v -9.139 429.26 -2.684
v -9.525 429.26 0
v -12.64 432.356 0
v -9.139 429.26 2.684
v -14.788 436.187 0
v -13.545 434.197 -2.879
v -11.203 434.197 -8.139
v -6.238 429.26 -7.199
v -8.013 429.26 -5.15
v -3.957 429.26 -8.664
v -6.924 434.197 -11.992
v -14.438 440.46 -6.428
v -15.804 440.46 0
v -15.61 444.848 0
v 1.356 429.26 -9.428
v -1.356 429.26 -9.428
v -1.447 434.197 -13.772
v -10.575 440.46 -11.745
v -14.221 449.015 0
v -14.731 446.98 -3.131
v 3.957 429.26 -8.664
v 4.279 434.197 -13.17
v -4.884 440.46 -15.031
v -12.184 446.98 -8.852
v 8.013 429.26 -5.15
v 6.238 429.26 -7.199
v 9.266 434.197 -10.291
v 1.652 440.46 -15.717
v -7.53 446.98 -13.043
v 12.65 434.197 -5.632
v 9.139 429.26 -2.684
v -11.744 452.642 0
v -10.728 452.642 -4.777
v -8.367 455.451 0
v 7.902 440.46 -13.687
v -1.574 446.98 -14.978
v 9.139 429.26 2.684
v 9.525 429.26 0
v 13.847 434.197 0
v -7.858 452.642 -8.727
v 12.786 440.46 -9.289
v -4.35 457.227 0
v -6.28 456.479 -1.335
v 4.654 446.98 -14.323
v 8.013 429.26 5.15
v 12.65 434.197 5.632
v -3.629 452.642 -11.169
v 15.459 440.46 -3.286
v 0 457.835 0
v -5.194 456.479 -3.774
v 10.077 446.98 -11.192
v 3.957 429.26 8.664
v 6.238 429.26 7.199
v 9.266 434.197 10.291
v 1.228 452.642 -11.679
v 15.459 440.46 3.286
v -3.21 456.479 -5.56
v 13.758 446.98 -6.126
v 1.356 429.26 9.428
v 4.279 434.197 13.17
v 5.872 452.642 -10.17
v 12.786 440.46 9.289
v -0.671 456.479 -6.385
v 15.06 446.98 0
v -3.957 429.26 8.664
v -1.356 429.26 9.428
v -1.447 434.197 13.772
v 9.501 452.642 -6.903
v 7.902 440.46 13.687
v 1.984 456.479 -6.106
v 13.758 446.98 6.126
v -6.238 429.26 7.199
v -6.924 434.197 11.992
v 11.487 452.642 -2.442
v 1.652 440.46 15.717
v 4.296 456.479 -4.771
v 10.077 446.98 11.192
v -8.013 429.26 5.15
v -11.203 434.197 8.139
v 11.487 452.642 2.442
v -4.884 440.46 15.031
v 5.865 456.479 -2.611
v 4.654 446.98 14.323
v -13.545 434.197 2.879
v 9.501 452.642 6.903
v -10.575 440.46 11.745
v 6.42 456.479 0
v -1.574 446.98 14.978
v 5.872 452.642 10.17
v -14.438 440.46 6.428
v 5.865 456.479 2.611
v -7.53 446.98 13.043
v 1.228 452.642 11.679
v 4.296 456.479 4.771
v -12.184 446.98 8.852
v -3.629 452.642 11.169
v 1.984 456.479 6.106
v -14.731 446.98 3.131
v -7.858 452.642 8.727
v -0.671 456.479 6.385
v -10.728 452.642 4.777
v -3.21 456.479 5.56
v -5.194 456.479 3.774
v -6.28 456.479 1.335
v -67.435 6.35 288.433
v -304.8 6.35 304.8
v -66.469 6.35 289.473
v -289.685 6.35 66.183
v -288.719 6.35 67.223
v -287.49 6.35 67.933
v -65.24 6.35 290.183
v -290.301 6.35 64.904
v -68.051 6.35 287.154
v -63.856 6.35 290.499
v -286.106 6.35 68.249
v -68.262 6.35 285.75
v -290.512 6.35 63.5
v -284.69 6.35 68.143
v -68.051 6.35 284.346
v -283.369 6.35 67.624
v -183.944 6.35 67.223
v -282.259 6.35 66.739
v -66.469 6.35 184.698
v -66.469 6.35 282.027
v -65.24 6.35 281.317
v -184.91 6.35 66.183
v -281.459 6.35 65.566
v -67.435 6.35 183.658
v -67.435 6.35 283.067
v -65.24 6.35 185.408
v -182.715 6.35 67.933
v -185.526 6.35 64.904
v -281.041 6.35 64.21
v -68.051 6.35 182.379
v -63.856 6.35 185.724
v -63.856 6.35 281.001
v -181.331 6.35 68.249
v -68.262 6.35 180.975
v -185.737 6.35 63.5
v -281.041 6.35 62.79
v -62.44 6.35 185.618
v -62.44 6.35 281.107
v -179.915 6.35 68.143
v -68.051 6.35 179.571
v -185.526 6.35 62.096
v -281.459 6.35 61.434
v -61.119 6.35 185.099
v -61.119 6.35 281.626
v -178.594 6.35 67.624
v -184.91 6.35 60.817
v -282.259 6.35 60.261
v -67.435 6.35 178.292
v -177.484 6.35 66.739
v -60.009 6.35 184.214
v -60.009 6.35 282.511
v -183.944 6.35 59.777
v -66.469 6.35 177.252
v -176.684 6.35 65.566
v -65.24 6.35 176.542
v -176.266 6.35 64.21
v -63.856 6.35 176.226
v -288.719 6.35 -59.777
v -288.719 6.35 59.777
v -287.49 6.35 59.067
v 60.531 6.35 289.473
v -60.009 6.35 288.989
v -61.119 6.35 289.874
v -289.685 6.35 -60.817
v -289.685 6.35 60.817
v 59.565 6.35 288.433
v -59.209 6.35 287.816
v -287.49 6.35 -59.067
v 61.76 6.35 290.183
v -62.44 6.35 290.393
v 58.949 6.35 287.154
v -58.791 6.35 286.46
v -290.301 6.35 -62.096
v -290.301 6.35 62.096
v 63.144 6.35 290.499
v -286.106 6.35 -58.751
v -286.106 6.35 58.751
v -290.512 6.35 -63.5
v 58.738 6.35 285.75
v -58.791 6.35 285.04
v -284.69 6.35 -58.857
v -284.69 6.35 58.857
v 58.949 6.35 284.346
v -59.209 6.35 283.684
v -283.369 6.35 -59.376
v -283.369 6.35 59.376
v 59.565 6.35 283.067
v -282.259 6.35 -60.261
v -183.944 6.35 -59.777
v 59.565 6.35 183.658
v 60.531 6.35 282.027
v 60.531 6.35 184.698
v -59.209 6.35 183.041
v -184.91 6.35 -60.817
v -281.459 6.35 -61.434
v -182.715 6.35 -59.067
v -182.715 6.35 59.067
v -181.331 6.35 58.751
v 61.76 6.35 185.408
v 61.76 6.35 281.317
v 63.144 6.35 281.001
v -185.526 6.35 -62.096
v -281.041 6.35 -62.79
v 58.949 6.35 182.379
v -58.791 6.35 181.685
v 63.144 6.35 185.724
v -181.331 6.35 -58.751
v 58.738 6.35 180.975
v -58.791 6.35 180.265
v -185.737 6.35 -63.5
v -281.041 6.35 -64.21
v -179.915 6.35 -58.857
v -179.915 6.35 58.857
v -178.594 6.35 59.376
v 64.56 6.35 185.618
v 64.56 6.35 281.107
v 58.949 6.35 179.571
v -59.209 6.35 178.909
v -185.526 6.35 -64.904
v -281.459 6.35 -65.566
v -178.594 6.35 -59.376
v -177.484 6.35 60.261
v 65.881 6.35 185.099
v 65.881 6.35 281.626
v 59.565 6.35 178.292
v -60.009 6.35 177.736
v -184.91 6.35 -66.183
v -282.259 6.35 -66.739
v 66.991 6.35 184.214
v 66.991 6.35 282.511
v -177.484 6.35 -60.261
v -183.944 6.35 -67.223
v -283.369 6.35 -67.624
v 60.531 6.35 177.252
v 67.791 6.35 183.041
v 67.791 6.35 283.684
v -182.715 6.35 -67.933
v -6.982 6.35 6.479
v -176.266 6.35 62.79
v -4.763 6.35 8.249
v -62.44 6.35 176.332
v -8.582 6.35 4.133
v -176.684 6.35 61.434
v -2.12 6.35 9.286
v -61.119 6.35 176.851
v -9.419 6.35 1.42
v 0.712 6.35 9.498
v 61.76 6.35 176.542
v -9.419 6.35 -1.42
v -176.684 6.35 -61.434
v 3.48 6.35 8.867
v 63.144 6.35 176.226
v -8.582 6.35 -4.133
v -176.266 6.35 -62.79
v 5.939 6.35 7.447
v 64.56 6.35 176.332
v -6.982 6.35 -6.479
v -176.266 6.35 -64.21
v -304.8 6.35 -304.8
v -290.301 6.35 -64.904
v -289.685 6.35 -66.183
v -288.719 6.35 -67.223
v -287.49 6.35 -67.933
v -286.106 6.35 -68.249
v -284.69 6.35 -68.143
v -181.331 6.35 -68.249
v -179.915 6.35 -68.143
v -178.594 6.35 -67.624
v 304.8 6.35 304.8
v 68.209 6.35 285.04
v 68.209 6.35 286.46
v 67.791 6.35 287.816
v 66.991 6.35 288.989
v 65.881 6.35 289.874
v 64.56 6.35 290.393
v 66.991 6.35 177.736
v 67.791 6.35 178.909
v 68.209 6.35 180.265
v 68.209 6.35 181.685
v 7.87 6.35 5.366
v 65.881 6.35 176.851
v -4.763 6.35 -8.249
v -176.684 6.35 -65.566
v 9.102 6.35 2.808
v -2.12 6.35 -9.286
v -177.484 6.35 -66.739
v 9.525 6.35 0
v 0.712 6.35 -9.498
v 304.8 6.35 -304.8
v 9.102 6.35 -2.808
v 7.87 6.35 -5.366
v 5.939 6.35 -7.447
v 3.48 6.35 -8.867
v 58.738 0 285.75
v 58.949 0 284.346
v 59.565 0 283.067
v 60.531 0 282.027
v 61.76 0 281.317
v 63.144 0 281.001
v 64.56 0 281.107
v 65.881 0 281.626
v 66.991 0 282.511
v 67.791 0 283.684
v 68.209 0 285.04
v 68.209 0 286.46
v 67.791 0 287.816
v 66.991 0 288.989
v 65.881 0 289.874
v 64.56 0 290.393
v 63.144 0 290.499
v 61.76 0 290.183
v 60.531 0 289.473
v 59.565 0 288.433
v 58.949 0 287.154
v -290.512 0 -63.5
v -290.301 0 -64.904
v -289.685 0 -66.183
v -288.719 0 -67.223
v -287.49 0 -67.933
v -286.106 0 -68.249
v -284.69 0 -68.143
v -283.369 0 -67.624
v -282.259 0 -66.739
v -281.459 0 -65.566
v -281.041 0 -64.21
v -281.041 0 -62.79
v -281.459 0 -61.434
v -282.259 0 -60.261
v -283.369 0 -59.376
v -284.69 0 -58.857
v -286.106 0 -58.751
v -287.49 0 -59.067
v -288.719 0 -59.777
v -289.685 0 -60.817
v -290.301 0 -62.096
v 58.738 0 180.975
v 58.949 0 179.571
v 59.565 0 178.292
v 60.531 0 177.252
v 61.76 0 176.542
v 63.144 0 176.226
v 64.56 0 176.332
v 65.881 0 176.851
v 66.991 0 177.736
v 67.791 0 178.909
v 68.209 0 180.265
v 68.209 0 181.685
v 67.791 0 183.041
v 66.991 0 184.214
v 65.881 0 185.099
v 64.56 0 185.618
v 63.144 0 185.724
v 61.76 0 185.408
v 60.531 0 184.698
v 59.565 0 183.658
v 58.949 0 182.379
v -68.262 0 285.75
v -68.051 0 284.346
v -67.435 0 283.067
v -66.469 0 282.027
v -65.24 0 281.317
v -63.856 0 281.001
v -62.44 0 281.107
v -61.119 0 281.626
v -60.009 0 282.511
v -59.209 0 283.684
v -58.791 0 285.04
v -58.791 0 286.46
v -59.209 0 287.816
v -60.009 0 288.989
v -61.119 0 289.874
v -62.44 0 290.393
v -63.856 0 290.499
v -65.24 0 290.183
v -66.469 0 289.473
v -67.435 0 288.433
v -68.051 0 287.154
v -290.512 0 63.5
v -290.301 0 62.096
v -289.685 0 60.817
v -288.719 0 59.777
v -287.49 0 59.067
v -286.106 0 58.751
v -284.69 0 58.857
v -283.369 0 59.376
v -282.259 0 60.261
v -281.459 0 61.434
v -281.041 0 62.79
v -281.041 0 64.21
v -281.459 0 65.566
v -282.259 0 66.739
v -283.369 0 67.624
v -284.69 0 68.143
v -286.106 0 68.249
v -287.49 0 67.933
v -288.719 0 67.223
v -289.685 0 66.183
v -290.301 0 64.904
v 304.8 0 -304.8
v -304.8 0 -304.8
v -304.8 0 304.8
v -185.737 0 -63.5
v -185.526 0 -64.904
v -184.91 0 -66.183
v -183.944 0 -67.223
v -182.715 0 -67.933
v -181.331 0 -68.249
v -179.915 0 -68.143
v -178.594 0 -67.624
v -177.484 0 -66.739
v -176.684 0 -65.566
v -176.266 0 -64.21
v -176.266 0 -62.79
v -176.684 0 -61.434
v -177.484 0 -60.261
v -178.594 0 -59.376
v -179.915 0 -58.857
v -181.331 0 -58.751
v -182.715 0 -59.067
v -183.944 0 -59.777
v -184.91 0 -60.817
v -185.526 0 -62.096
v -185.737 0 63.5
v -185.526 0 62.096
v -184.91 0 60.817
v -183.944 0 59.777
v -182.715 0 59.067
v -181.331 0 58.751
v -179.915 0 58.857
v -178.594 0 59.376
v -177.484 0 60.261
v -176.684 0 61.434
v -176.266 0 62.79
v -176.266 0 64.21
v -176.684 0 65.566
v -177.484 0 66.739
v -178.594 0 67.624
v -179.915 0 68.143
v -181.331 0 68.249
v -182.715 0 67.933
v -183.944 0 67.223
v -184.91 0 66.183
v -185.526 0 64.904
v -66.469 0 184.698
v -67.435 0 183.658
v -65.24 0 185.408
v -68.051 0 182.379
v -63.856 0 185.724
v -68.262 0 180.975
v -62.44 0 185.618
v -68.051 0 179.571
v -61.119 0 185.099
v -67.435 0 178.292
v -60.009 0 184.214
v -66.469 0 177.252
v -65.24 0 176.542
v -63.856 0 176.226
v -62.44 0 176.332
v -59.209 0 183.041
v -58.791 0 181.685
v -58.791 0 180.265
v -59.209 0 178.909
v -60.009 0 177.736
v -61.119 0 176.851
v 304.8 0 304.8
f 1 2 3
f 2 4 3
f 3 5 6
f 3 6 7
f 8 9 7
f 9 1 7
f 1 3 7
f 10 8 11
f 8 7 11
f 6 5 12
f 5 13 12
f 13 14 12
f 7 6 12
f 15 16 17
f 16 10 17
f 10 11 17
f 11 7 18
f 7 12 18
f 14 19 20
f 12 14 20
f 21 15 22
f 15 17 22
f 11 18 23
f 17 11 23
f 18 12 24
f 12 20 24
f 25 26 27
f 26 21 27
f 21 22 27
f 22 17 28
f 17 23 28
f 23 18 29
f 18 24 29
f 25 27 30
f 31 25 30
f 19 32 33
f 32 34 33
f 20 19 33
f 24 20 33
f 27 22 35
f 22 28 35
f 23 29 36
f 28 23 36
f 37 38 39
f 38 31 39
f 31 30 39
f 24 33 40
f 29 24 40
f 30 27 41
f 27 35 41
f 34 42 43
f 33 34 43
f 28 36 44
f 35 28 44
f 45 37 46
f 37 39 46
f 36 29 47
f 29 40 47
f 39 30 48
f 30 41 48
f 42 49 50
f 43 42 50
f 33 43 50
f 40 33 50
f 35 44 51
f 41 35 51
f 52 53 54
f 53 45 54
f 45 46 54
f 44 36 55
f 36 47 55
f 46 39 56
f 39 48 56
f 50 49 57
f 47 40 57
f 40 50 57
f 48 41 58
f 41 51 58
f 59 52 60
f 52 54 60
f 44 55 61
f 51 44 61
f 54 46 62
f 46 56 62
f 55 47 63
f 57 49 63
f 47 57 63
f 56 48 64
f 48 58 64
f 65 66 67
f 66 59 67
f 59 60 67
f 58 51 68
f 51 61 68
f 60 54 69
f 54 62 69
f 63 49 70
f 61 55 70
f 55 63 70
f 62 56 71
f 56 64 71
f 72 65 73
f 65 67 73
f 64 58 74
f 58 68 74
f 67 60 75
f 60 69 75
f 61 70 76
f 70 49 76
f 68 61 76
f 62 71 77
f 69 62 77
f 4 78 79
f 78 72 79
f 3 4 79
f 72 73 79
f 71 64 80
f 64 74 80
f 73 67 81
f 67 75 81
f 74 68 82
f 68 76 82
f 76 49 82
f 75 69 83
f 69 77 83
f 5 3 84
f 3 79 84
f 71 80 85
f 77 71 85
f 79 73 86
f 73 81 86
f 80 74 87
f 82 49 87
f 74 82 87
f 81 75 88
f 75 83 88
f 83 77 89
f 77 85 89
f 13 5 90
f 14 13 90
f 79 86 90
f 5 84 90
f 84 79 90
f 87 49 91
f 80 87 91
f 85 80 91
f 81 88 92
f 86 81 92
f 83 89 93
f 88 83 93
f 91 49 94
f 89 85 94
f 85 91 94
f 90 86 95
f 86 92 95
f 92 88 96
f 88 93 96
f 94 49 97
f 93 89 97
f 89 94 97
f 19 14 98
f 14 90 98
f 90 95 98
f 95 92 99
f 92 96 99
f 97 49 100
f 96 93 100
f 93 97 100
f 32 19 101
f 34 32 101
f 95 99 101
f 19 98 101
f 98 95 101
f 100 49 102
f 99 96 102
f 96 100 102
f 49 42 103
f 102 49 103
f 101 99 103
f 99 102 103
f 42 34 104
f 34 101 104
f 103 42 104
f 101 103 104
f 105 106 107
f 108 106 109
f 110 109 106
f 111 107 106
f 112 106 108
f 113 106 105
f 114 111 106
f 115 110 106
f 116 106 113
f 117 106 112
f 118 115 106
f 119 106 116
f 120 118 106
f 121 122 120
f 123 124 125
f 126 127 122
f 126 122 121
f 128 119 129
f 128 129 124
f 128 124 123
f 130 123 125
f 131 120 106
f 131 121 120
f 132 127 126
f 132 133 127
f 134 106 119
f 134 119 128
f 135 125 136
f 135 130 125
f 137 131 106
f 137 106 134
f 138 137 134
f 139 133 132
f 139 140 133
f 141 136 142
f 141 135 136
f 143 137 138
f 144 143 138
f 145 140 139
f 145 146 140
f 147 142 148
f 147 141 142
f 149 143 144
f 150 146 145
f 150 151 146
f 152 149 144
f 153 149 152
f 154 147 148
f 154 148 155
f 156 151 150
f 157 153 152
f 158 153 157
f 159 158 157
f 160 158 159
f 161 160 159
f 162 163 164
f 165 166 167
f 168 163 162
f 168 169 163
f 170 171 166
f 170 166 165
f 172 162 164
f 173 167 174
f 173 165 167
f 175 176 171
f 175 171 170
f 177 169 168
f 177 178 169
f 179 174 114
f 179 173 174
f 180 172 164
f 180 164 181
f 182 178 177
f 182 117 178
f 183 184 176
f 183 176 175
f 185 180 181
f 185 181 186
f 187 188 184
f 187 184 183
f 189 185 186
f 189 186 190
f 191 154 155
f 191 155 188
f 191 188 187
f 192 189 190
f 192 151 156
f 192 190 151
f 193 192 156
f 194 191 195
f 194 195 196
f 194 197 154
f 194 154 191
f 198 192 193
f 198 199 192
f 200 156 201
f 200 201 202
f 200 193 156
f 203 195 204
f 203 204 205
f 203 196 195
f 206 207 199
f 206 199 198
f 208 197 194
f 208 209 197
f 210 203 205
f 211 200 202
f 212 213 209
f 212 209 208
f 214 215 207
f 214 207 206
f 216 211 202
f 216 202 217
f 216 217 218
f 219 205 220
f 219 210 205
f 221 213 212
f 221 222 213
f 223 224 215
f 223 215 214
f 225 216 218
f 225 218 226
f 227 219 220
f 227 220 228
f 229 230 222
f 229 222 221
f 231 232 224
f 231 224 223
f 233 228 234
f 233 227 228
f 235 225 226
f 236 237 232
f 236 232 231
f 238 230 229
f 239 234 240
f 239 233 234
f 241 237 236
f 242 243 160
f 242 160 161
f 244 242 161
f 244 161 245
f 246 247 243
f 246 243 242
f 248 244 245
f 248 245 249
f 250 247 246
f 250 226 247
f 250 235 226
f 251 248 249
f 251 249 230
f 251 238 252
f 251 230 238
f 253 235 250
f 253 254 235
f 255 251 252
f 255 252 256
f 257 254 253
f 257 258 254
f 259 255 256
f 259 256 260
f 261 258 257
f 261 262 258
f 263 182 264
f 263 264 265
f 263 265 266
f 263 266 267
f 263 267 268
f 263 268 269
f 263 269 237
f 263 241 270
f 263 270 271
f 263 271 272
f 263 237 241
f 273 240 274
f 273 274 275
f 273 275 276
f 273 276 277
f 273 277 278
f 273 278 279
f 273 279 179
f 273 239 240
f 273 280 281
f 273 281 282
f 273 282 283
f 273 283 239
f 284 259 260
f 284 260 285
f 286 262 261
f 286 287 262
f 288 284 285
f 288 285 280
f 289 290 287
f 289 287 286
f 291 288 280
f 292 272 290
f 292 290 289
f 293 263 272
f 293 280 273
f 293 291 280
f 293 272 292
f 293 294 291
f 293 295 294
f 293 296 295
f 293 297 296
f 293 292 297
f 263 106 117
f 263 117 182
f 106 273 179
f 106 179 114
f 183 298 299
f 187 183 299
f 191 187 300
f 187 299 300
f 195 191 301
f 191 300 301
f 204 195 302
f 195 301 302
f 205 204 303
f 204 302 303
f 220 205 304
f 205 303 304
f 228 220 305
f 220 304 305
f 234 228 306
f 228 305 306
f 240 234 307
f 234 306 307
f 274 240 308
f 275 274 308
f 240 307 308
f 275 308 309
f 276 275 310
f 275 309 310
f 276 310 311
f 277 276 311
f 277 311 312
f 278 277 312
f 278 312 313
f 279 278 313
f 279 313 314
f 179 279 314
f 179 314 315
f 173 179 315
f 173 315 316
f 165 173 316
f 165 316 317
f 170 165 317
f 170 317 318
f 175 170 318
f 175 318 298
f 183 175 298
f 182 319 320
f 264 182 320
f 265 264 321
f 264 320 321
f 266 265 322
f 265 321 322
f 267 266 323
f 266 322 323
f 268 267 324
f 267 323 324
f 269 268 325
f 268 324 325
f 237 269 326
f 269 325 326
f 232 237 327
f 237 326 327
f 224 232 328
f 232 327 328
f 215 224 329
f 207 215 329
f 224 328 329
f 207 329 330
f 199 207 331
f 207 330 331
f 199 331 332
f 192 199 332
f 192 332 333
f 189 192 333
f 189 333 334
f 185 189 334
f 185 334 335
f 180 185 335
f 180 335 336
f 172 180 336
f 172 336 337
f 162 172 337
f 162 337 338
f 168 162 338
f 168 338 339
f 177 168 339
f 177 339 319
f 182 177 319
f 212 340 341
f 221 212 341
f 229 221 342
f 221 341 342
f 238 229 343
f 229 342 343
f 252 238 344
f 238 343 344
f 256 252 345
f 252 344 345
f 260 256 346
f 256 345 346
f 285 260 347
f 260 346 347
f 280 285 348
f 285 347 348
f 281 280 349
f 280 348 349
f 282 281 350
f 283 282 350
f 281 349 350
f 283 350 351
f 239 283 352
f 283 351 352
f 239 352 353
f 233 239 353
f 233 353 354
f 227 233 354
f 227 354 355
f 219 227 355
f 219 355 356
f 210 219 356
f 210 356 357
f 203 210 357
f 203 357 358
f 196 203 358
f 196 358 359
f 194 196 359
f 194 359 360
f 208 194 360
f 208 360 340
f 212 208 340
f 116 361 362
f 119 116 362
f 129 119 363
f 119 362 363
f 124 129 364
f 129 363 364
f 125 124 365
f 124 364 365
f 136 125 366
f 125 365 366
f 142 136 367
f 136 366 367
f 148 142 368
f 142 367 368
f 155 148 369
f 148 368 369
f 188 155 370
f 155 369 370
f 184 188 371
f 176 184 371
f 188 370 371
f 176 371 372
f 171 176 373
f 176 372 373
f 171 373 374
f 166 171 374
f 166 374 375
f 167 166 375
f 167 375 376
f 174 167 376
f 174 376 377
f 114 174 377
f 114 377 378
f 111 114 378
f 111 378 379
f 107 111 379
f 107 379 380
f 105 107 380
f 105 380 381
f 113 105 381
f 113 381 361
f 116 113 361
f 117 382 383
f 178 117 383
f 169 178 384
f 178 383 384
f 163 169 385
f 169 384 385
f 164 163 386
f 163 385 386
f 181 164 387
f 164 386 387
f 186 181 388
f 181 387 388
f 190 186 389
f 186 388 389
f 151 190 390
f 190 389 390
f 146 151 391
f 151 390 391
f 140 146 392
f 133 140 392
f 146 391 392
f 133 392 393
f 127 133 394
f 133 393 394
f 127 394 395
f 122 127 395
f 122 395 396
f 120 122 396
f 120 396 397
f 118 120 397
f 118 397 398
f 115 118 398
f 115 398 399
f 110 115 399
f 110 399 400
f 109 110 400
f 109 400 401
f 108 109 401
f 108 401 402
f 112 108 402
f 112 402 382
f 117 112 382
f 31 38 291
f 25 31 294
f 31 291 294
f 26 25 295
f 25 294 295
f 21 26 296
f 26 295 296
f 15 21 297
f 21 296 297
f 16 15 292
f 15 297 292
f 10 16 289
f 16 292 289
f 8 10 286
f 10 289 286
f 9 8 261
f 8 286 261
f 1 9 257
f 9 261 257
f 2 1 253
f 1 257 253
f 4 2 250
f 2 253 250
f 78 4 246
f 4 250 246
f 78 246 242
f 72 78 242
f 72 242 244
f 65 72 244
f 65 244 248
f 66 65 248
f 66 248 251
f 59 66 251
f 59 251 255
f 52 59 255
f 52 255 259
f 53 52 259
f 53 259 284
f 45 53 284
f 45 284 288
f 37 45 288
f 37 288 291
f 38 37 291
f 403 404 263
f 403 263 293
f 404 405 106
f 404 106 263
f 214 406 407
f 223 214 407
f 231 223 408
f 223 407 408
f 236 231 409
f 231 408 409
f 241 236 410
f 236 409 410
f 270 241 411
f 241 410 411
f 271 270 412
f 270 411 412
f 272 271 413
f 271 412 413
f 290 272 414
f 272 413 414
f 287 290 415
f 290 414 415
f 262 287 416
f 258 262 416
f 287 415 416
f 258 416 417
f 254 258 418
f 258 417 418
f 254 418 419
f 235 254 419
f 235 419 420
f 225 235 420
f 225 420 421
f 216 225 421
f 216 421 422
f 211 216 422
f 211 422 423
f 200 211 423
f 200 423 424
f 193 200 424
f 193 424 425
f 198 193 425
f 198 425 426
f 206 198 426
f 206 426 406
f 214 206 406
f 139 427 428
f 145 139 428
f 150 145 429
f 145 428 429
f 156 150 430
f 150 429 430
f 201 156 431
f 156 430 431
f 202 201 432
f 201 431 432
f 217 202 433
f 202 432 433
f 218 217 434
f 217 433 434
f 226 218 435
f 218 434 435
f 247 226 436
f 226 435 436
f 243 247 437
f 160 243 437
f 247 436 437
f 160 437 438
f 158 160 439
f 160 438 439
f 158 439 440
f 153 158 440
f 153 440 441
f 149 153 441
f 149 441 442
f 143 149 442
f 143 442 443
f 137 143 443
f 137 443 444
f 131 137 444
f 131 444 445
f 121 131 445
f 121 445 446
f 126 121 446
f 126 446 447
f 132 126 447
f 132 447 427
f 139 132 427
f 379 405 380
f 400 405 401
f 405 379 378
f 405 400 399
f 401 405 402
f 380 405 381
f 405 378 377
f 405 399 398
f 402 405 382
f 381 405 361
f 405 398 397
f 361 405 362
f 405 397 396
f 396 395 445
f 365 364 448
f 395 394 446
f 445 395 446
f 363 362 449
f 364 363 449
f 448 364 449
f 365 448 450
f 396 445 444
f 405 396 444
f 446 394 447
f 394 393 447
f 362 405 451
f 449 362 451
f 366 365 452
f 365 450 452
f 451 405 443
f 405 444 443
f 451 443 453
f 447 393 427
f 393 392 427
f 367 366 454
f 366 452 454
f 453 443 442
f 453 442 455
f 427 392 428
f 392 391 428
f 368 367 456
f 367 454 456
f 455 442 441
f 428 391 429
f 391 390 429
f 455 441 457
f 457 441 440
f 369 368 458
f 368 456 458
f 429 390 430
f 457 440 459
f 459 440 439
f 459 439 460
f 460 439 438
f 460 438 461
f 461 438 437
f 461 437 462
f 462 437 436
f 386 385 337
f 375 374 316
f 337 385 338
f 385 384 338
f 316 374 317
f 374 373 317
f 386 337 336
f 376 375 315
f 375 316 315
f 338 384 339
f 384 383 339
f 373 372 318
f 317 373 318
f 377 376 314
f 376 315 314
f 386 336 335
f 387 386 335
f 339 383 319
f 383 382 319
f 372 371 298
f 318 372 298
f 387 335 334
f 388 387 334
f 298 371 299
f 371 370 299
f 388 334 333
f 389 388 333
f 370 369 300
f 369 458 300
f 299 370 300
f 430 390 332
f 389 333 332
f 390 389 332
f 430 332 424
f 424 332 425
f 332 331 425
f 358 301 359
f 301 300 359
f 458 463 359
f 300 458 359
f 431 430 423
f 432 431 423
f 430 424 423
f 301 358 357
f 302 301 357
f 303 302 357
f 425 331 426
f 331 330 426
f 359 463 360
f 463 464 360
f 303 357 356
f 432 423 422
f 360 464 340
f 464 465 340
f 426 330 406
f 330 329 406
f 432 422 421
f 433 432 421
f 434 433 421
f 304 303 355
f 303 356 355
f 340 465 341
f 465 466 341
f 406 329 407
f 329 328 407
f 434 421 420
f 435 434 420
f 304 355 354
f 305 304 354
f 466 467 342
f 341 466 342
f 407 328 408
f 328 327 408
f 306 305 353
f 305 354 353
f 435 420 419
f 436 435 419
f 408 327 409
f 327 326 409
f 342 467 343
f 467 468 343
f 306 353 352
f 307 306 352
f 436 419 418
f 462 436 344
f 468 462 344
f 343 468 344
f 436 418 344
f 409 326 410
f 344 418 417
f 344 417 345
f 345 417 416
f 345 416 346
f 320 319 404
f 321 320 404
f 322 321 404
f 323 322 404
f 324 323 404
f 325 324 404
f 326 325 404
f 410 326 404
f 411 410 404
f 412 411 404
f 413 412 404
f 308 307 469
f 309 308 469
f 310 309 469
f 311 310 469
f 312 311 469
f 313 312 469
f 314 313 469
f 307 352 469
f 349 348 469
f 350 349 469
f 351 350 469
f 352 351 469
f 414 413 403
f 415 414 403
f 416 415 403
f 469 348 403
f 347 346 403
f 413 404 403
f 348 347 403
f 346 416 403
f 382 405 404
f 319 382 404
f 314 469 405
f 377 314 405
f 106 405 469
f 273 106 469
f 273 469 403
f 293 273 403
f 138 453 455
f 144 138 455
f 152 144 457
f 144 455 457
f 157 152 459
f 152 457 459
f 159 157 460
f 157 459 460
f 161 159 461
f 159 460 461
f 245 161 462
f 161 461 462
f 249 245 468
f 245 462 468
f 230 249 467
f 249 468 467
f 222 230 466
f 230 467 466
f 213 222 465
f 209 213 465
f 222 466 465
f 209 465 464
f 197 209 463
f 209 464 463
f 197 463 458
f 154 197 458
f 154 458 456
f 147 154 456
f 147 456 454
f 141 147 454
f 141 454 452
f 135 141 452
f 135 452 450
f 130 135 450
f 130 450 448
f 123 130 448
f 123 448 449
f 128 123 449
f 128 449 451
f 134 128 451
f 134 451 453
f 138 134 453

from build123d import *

# Parameters (mm, degrees)
SKETCH1_W                        = 609.6
SKETCH1_H                        = 609.6
BOSS_EXTRUDE1_DEPTH              = 6.35
F_3_8_0_375_DIAMETER_HOLE1_D     = 9.525
F_3_8_0_375_DIAMETER_HOLE1_DEPTH = 11.684
F_3_8_0_375_DIAMETER_HOLE1_TIP   = 2.861598698
SKETCH4_R                        = 9.525
BOSS_EXTRUDE2_DEPTH              = 422.91


with BuildPart() as part:
    # Sketch1 → Boss-Extrude1 (new body)
    with BuildSketch(Plane(origin=(0, 0, 0), x_dir=(1, 0, 0), z_dir=(0, 1, 0))):
        Rectangle(SKETCH1_W, SKETCH1_H)
    extrude(amount=BOSS_EXTRUDE1_DEPTH)

    # 3/8 (0.375) Diameter Hole1
    with Locations(Plane(origin=(0, 6.35, 0), x_dir=(1, 0, 0), z_dir=(0, 1, 0))):
        with Locations((-63.5, -285.75), (63.5, -285.75), (-285.75, 63.5), (-285.75, -63.5), (-63.5, -180.975), (63.5, -180.975), (-180.975, -63.5), (-180.975, 63.5)):
            Hole(F_3_8_0_375_DIAMETER_HOLE1_D / 2, depth=F_3_8_0_375_DIAMETER_HOLE1_DEPTH)
            with Locations((0, 0, -(F_3_8_0_375_DIAMETER_HOLE1_DEPTH + F_3_8_0_375_DIAMETER_HOLE1_TIP / 2))):  # 118° drill point
                Cone(0, F_3_8_0_375_DIAMETER_HOLE1_D / 2, F_3_8_0_375_DIAMETER_HOLE1_TIP, mode=Mode.SUBTRACT)

    # Sketch4 → Boss-Extrude2 (add)
    with BuildSketch(Plane(origin=(0, 6.35, 0), x_dir=(1, 0, 0), z_dir=(0, 1, 0))):
        Circle(SKETCH4_R)
    extrude(amount=BOSS_EXTRUDE2_DEPTH)

    # Sketch5 → Revolve3 (revolve)
    with BuildSketch(Plane.XY):
        with BuildLine():
            Line((0, 457.835), (0, 426.085))
            ThreePointArc((0, 426.085), (-15.875, 441.96), (0, 457.835))
        make_face()
    revolve(axis=Axis((0, 599.823656089, 0), (0, -1, 0)))


solid = part.part
